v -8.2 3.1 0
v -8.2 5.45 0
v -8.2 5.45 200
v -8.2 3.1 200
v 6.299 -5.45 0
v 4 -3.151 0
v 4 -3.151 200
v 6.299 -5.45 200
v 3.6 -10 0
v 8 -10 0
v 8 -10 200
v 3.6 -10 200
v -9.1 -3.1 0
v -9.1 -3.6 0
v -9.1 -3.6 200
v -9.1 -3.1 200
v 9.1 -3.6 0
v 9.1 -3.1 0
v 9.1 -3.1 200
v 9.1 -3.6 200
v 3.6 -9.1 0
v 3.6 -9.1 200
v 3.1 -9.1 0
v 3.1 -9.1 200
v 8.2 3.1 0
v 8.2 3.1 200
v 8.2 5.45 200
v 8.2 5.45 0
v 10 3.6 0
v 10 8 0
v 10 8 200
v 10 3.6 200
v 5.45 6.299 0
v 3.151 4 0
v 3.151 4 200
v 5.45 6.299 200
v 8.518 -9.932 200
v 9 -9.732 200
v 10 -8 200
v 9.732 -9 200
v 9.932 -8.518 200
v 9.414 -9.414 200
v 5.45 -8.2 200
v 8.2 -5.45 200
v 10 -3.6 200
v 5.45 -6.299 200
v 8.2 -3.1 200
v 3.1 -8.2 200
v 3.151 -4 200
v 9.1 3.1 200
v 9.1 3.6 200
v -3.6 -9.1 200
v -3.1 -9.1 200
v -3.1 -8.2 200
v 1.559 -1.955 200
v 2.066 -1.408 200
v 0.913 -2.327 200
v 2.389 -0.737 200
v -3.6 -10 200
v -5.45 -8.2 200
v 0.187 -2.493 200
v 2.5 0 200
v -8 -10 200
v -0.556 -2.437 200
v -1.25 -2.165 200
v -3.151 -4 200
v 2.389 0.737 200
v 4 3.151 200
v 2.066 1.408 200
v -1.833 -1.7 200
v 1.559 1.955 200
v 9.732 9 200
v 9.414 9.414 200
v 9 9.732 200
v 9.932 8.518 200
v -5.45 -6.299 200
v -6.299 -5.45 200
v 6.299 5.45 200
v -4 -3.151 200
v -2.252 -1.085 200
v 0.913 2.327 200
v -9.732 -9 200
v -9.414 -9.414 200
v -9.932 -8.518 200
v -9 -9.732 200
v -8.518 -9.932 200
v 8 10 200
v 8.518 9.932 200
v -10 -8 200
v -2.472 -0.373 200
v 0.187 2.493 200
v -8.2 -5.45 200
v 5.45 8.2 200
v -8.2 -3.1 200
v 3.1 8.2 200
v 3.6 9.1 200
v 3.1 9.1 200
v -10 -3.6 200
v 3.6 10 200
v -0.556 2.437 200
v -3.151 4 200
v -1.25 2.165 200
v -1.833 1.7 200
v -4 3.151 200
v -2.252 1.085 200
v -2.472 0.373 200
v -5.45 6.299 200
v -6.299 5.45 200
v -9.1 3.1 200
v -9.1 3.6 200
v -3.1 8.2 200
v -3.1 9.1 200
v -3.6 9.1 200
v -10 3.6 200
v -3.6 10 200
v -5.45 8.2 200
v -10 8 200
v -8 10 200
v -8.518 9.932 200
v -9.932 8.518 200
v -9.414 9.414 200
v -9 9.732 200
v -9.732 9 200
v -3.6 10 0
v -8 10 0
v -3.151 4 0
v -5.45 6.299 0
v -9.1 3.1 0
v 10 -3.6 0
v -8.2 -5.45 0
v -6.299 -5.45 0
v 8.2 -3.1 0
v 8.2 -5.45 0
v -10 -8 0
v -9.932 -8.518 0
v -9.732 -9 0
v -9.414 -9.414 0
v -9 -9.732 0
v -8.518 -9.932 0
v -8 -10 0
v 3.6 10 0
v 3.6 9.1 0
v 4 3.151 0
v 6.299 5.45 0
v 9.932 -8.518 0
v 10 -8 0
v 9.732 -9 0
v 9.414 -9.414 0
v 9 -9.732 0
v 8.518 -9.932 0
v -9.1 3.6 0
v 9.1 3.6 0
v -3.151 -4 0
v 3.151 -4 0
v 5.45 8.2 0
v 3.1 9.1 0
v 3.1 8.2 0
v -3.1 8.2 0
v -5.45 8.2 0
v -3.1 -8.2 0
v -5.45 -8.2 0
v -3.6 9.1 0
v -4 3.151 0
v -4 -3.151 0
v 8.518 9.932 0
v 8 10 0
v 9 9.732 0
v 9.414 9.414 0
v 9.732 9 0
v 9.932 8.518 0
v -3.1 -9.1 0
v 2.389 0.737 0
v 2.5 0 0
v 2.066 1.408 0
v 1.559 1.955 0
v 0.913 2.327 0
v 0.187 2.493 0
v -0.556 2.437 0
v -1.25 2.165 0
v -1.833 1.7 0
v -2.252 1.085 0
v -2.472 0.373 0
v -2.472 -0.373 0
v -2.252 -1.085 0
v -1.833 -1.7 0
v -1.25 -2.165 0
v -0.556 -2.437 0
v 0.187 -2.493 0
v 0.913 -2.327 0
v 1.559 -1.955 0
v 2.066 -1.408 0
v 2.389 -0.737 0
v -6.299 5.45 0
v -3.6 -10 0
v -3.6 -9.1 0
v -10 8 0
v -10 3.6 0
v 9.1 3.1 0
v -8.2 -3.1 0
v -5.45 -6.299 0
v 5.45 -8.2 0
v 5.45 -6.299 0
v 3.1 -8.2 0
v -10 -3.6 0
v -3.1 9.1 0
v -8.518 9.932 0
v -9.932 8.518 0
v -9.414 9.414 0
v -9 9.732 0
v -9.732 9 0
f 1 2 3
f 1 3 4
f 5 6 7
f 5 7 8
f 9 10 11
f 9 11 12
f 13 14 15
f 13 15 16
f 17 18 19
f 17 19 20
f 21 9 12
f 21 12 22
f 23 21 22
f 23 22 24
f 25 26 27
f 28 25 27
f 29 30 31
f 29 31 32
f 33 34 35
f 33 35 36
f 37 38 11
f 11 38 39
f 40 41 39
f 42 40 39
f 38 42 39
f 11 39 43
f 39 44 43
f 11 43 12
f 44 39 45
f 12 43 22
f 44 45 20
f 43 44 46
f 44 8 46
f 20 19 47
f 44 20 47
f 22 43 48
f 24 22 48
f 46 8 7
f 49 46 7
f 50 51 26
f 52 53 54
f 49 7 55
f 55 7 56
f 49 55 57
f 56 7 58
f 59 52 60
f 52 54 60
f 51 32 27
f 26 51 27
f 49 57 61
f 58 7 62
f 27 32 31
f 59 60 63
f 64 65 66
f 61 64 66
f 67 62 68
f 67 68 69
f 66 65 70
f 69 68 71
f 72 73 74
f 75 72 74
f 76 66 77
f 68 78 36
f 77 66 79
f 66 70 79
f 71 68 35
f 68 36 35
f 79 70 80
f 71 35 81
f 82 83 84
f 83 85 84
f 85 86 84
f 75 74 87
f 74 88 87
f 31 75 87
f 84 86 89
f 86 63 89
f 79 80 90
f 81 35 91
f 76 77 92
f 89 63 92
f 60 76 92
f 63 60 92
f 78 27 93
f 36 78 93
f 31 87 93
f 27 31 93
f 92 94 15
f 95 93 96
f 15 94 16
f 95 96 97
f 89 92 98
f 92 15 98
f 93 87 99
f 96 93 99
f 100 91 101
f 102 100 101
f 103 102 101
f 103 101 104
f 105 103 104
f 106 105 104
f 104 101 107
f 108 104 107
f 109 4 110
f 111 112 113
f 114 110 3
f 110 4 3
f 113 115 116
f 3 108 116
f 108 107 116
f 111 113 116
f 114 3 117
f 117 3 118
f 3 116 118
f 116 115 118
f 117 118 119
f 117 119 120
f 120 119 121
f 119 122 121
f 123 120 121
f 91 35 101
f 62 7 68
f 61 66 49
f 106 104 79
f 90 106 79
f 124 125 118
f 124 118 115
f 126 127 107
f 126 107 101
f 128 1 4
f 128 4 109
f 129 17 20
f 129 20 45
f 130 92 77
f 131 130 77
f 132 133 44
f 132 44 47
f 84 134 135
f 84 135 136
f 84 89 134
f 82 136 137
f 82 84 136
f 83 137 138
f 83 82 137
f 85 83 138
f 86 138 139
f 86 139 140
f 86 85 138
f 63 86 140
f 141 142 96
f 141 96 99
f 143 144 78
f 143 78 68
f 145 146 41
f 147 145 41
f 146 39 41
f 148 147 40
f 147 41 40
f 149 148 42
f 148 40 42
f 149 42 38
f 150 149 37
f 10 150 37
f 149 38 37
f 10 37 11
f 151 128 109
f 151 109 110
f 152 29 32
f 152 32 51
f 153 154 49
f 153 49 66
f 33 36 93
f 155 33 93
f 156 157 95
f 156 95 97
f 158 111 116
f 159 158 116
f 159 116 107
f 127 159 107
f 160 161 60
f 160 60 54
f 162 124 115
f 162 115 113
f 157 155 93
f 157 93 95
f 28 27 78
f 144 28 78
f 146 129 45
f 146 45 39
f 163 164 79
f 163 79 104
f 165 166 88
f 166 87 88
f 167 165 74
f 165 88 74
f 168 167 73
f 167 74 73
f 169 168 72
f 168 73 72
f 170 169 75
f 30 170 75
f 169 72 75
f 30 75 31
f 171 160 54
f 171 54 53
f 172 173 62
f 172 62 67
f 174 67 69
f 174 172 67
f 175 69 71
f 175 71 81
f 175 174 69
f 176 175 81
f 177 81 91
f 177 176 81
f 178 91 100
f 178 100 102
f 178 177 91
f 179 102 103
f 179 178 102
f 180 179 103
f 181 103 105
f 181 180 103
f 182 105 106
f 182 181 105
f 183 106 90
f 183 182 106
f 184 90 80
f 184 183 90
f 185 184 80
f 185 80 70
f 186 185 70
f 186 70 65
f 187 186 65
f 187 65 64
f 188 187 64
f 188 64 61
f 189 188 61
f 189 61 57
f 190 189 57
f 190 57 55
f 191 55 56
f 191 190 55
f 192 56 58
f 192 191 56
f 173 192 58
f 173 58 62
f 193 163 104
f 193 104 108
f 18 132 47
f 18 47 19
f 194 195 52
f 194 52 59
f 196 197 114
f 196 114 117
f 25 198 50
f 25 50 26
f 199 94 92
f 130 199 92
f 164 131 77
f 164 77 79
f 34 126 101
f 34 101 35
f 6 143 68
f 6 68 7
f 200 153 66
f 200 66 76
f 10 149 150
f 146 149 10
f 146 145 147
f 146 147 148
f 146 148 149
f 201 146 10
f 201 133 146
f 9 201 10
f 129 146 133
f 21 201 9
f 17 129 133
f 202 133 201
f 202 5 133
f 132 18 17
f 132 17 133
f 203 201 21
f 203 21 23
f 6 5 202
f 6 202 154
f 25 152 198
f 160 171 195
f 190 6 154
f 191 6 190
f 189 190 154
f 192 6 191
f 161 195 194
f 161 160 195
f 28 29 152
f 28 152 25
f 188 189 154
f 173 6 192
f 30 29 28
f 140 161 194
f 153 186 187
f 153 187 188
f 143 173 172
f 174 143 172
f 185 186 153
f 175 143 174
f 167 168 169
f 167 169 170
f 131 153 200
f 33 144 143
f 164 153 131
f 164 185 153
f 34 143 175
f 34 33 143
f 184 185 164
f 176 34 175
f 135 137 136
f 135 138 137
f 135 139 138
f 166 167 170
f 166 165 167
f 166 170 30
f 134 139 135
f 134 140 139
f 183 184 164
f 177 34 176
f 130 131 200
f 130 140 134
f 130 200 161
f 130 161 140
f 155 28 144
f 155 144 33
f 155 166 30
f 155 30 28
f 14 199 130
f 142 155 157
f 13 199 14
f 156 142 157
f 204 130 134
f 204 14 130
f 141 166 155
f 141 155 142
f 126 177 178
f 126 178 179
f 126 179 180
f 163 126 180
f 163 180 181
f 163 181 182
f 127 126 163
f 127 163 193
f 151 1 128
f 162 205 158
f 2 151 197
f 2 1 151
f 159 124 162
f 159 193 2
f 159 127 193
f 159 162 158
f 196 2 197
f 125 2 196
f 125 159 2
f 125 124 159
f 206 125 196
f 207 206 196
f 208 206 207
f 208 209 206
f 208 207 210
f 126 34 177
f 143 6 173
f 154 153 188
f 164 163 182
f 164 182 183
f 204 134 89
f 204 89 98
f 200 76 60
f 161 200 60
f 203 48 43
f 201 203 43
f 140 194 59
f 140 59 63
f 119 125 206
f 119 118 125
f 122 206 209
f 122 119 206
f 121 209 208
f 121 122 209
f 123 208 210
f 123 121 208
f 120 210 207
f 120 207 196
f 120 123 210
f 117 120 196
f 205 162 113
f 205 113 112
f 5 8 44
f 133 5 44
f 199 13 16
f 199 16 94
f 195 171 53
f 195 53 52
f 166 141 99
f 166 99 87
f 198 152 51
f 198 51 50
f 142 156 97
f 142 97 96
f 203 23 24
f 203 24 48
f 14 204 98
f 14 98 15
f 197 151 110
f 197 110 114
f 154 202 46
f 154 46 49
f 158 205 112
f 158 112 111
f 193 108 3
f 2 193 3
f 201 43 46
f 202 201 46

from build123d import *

# Parameters (mm, degrees)
SKETCH_1_R      = 2.5
EXTRUDE_1_DEPTH = 200
FILLET_1_R      = 2


with BuildPart() as part:
    # 草图1 → 凸台-拉伸1 (new body)
    with BuildSketch(Plane.XY):
        Polygon((-3.151471863, 4), (3.151471863, 4), (5.45, 6.298528137), (5.45, 8.2), (3.1, 8.2), (3.1, 9.1), (3.6, 9.1), (3.6, 10), (10, 10), (10, 3.6), (9.1, 3.6), (9.1, 3.1), (8.2, 3.1), (8.2, 5.45), (6.298528137, 5.45), (4, 3.151471863), (4, -3.151471863), (6.298528137, -5.45), (8.2, -5.45), (8.2, -3.1), (9.1, -3.1), (9.1, -3.6), (10, -3.6), (10, -10), (3.6, -10), (3.6, -9.1), (3.1, -9.1), (3.1, -8.2), (5.45, -8.2), (5.45, -6.298528137), (3.151471863, -4), (-3.151471863, -4), (-5.45, -6.298528137), (-5.45, -8.2), (-3.1, -8.2), (-3.1, -9.1), (-3.6, -9.1), (-3.6, -10), (-10, -10), (-10, -3.6), (-9.1, -3.6), (-9.1, -3.1), (-8.2, -3.1), (-8.2, -5.45), (-6.298528137, -5.45), (-4, -3.151471863), (-4, 3.151471863), (-6.298528137, 5.45), (-8.2, 5.45), (-8.2, 3.1), (-9.1, 3.1), (-9.1, 3.6), (-10, 3.6), (-10, 10), (-3.6, 10), (-3.6, 9.1), (-3.1, 9.1), (-3.1, 8.2), (-5.45, 8.2), (-5.45, 6.298528137), align=None)
        Circle(SKETCH_1_R, mode=Mode.SUBTRACT)
    extrude(amount=EXTRUDE_1_DEPTH)

    # 圆角1
    fillet_1_edges = [part.edges().sort_by_distance(p)[0] for p in [
        (10, -10, 100),
        (-10, -10, 100),
        (-10, 10, 100),
        (10, 10, 100),
    ]]
    fillet(fillet_1_edges, radius=FILLET_1_R)


solid = part.part
